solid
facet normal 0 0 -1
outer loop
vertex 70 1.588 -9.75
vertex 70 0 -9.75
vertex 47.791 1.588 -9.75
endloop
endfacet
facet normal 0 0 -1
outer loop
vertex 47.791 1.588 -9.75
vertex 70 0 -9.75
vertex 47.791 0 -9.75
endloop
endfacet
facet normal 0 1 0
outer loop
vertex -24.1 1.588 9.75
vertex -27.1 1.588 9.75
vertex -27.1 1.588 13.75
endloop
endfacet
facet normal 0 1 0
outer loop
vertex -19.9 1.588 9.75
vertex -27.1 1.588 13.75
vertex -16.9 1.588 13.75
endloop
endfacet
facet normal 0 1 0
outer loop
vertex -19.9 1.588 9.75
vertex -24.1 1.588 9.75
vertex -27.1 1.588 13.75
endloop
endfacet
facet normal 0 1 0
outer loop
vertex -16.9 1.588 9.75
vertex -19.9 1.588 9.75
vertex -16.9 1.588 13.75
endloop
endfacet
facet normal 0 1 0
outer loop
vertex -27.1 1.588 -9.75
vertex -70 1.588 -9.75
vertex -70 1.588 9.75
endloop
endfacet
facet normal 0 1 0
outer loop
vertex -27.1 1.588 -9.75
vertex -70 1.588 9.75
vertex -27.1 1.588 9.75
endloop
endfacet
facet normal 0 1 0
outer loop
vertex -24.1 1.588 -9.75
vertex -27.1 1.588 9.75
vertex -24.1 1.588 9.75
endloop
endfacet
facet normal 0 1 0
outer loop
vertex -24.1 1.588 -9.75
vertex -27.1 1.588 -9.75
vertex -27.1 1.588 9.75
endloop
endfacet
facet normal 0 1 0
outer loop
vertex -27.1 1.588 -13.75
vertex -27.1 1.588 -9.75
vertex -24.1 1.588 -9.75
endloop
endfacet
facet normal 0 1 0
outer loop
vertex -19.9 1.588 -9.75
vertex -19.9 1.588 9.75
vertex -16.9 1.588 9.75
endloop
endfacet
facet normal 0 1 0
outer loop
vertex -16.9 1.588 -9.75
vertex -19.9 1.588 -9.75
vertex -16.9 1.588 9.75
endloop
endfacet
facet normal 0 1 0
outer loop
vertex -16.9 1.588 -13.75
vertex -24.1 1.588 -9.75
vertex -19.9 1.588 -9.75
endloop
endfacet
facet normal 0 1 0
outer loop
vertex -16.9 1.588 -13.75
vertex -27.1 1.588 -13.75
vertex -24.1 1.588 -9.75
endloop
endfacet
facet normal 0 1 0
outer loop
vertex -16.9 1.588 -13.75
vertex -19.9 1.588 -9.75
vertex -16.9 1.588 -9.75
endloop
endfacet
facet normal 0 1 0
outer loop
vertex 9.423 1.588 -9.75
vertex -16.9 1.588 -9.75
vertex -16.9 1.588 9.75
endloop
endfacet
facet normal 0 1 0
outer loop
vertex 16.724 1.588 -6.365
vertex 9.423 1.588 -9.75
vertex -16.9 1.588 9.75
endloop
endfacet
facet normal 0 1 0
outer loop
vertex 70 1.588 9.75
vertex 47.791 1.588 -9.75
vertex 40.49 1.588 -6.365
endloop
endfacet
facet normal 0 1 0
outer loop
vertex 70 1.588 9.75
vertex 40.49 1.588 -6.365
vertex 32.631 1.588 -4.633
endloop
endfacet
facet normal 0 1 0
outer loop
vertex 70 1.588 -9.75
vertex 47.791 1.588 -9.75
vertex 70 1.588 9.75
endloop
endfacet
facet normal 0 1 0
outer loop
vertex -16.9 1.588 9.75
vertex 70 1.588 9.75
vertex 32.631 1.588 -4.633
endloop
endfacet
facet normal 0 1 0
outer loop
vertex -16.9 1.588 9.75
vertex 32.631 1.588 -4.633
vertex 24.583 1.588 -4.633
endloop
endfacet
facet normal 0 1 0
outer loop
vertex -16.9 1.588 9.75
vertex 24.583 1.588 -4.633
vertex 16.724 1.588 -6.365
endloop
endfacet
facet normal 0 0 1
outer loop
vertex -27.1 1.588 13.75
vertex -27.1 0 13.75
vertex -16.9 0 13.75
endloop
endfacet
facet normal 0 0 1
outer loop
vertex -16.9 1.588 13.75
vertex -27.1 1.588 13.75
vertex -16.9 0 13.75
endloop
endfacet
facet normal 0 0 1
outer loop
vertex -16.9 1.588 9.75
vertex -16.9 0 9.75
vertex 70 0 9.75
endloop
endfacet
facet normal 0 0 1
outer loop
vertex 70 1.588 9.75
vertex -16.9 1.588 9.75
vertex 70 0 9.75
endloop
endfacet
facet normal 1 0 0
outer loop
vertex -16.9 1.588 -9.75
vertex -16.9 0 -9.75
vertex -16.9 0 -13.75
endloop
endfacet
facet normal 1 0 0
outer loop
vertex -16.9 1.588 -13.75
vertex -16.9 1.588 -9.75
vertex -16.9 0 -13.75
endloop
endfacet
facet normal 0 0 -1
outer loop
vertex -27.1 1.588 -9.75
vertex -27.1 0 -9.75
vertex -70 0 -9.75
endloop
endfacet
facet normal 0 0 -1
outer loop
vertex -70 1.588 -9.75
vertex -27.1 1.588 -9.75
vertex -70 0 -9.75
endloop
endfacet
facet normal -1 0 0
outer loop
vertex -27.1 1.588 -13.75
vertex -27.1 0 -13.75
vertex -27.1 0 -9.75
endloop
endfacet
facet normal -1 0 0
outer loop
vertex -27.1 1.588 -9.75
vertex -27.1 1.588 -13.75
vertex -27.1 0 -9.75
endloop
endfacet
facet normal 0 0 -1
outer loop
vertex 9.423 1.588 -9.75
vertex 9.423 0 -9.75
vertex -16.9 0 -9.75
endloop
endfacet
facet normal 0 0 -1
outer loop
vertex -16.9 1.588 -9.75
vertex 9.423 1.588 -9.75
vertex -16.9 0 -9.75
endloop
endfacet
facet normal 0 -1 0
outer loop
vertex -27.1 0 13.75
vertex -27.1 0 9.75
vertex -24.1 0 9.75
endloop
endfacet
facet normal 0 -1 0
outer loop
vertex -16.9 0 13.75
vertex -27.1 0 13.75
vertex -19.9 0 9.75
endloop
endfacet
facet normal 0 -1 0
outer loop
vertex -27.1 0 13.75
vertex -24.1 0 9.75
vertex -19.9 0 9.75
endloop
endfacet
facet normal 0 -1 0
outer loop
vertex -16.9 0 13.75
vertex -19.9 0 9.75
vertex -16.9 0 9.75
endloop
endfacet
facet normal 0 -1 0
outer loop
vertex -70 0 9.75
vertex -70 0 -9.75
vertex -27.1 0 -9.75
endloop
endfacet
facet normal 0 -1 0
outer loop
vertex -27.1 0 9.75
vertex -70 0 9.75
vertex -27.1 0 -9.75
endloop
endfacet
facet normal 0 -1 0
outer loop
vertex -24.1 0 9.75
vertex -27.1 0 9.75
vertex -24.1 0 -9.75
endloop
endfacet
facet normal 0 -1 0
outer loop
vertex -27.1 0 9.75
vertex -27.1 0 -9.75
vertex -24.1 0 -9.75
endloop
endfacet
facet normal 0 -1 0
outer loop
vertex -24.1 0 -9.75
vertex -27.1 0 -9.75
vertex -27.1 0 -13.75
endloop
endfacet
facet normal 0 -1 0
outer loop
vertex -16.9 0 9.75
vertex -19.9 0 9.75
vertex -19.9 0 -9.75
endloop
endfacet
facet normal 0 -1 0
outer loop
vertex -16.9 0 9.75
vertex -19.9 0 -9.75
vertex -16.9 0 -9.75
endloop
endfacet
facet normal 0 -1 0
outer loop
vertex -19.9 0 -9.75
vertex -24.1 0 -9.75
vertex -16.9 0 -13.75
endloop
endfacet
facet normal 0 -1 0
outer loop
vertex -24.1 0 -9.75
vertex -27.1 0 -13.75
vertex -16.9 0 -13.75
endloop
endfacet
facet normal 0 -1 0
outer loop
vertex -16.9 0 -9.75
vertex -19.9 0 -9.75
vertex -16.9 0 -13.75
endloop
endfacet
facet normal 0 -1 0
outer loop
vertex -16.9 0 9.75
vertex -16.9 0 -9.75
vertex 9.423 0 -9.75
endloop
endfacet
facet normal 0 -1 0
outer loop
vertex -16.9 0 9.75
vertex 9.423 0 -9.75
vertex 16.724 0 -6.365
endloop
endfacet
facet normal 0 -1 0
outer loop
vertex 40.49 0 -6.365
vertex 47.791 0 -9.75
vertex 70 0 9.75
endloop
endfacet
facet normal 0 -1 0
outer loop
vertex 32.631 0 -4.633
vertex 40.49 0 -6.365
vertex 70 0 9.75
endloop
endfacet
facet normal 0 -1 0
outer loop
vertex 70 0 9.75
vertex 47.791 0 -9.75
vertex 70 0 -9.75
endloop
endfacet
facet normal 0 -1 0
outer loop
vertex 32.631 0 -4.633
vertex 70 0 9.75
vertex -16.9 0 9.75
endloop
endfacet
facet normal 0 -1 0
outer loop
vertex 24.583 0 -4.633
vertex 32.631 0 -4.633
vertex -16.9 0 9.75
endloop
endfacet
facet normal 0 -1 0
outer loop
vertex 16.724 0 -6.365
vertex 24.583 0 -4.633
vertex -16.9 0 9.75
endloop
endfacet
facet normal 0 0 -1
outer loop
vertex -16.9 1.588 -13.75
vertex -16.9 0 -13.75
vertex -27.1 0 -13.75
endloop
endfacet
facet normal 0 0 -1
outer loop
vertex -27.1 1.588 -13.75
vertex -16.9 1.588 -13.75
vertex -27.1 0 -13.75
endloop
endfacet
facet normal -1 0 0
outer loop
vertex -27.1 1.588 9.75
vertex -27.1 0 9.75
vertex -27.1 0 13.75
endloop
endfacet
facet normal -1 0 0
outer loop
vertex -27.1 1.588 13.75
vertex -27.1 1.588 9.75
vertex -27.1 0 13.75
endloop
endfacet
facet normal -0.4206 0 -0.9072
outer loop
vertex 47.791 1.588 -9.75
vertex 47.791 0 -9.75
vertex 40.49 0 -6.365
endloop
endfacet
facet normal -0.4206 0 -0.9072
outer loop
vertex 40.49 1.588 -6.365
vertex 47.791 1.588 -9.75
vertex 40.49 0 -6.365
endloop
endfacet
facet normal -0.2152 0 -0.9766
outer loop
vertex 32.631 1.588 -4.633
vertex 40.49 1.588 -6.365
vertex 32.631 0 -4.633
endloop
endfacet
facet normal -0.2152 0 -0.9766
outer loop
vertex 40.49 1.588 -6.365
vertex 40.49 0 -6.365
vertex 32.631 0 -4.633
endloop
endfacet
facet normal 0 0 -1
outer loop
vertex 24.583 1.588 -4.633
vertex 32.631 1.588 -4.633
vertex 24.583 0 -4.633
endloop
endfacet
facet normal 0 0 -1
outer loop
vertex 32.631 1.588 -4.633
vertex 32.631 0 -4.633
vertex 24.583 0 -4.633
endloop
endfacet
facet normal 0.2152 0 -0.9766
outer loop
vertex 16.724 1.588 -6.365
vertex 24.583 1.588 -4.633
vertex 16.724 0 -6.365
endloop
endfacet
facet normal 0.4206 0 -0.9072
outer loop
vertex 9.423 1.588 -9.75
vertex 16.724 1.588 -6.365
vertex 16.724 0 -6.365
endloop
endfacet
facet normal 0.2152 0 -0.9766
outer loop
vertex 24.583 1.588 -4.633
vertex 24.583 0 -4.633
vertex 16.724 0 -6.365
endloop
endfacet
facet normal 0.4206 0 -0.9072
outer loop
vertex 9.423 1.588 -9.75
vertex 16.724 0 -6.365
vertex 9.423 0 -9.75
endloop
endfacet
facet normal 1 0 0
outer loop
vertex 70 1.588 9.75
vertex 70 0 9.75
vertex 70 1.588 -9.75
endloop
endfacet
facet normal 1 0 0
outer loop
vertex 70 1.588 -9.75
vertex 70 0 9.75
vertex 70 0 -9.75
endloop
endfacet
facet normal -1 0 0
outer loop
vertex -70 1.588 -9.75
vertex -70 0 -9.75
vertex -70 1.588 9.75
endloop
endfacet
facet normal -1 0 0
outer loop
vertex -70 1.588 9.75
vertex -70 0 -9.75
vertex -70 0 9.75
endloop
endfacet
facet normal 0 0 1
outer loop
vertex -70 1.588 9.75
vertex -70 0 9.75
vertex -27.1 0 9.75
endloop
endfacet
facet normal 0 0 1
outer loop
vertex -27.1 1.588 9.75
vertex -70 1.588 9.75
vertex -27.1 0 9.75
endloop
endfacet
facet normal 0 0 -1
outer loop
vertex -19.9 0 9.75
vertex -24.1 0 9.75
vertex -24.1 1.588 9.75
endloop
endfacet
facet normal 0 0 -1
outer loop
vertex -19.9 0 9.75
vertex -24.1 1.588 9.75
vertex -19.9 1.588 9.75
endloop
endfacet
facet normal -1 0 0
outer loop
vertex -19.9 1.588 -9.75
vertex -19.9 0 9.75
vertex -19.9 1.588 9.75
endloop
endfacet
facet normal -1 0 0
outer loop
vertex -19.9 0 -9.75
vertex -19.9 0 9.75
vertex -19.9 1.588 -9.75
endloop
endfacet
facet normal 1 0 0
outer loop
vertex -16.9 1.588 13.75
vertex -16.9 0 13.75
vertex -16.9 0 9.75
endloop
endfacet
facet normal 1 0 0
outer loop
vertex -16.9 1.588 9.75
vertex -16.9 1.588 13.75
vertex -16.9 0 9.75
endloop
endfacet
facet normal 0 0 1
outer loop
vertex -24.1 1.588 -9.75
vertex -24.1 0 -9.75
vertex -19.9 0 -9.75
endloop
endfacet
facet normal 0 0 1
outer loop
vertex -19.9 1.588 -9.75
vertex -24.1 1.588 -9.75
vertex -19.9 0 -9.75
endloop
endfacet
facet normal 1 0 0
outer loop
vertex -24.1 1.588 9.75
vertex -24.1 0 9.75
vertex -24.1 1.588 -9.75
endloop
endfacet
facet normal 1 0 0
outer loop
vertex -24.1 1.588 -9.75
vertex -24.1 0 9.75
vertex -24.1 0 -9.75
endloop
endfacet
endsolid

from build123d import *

# Parameters (mm, degrees)
SKETCH1_W           = 4.2
SKETCH1_H           = 19.5
BOSS_EXTRUDE1_DEPTH = 1.5875


with BuildPart() as part:
    # Sketch1 → Boss-Extrude1 (new body)
    with BuildSketch(Plane(origin=(0, 0, 0), x_dir=(1, 0, 0), z_dir=(0, 1, 0))):
        with BuildLine():
            Line((-27.1, 9.75), (-70, 9.75))
            Line((-70, 9.75), (-70, -9.75))
            Line((-70, -9.75), (-27.1, -9.75))
            Line((-27.1, -9.75), (-27.1, -13.75))
            Line((-27.1, -13.75), (-16.9, -13.75))
            Line((-16.9, -13.75), (-16.9, -9.75))
            Line((-16.9, -9.75), (70, -9.75))
            Line((70, -9.75), (70, 9.75))
            Line((70, 9.75), (47.791477279, 9.75))
            ThreePointArc((47.791477279, 9.75), (28.607181878, 4.414037573), (9.422886477, 9.75))
            Line((9.422886477, 9.75), (-16.9, 9.75))
            Line((-16.9, 9.75), (-16.9, 13.75))
            Line((-16.9, 13.75), (-27.1, 13.75))
            Line((-27.1, 13.75), (-27.1, 9.75))
        make_face()
        with Locations((-22, 0)):
            Rectangle(SKETCH1_W, SKETCH1_H, mode=Mode.SUBTRACT)
    extrude(amount=BOSS_EXTRUDE1_DEPTH)


solid = part.part
